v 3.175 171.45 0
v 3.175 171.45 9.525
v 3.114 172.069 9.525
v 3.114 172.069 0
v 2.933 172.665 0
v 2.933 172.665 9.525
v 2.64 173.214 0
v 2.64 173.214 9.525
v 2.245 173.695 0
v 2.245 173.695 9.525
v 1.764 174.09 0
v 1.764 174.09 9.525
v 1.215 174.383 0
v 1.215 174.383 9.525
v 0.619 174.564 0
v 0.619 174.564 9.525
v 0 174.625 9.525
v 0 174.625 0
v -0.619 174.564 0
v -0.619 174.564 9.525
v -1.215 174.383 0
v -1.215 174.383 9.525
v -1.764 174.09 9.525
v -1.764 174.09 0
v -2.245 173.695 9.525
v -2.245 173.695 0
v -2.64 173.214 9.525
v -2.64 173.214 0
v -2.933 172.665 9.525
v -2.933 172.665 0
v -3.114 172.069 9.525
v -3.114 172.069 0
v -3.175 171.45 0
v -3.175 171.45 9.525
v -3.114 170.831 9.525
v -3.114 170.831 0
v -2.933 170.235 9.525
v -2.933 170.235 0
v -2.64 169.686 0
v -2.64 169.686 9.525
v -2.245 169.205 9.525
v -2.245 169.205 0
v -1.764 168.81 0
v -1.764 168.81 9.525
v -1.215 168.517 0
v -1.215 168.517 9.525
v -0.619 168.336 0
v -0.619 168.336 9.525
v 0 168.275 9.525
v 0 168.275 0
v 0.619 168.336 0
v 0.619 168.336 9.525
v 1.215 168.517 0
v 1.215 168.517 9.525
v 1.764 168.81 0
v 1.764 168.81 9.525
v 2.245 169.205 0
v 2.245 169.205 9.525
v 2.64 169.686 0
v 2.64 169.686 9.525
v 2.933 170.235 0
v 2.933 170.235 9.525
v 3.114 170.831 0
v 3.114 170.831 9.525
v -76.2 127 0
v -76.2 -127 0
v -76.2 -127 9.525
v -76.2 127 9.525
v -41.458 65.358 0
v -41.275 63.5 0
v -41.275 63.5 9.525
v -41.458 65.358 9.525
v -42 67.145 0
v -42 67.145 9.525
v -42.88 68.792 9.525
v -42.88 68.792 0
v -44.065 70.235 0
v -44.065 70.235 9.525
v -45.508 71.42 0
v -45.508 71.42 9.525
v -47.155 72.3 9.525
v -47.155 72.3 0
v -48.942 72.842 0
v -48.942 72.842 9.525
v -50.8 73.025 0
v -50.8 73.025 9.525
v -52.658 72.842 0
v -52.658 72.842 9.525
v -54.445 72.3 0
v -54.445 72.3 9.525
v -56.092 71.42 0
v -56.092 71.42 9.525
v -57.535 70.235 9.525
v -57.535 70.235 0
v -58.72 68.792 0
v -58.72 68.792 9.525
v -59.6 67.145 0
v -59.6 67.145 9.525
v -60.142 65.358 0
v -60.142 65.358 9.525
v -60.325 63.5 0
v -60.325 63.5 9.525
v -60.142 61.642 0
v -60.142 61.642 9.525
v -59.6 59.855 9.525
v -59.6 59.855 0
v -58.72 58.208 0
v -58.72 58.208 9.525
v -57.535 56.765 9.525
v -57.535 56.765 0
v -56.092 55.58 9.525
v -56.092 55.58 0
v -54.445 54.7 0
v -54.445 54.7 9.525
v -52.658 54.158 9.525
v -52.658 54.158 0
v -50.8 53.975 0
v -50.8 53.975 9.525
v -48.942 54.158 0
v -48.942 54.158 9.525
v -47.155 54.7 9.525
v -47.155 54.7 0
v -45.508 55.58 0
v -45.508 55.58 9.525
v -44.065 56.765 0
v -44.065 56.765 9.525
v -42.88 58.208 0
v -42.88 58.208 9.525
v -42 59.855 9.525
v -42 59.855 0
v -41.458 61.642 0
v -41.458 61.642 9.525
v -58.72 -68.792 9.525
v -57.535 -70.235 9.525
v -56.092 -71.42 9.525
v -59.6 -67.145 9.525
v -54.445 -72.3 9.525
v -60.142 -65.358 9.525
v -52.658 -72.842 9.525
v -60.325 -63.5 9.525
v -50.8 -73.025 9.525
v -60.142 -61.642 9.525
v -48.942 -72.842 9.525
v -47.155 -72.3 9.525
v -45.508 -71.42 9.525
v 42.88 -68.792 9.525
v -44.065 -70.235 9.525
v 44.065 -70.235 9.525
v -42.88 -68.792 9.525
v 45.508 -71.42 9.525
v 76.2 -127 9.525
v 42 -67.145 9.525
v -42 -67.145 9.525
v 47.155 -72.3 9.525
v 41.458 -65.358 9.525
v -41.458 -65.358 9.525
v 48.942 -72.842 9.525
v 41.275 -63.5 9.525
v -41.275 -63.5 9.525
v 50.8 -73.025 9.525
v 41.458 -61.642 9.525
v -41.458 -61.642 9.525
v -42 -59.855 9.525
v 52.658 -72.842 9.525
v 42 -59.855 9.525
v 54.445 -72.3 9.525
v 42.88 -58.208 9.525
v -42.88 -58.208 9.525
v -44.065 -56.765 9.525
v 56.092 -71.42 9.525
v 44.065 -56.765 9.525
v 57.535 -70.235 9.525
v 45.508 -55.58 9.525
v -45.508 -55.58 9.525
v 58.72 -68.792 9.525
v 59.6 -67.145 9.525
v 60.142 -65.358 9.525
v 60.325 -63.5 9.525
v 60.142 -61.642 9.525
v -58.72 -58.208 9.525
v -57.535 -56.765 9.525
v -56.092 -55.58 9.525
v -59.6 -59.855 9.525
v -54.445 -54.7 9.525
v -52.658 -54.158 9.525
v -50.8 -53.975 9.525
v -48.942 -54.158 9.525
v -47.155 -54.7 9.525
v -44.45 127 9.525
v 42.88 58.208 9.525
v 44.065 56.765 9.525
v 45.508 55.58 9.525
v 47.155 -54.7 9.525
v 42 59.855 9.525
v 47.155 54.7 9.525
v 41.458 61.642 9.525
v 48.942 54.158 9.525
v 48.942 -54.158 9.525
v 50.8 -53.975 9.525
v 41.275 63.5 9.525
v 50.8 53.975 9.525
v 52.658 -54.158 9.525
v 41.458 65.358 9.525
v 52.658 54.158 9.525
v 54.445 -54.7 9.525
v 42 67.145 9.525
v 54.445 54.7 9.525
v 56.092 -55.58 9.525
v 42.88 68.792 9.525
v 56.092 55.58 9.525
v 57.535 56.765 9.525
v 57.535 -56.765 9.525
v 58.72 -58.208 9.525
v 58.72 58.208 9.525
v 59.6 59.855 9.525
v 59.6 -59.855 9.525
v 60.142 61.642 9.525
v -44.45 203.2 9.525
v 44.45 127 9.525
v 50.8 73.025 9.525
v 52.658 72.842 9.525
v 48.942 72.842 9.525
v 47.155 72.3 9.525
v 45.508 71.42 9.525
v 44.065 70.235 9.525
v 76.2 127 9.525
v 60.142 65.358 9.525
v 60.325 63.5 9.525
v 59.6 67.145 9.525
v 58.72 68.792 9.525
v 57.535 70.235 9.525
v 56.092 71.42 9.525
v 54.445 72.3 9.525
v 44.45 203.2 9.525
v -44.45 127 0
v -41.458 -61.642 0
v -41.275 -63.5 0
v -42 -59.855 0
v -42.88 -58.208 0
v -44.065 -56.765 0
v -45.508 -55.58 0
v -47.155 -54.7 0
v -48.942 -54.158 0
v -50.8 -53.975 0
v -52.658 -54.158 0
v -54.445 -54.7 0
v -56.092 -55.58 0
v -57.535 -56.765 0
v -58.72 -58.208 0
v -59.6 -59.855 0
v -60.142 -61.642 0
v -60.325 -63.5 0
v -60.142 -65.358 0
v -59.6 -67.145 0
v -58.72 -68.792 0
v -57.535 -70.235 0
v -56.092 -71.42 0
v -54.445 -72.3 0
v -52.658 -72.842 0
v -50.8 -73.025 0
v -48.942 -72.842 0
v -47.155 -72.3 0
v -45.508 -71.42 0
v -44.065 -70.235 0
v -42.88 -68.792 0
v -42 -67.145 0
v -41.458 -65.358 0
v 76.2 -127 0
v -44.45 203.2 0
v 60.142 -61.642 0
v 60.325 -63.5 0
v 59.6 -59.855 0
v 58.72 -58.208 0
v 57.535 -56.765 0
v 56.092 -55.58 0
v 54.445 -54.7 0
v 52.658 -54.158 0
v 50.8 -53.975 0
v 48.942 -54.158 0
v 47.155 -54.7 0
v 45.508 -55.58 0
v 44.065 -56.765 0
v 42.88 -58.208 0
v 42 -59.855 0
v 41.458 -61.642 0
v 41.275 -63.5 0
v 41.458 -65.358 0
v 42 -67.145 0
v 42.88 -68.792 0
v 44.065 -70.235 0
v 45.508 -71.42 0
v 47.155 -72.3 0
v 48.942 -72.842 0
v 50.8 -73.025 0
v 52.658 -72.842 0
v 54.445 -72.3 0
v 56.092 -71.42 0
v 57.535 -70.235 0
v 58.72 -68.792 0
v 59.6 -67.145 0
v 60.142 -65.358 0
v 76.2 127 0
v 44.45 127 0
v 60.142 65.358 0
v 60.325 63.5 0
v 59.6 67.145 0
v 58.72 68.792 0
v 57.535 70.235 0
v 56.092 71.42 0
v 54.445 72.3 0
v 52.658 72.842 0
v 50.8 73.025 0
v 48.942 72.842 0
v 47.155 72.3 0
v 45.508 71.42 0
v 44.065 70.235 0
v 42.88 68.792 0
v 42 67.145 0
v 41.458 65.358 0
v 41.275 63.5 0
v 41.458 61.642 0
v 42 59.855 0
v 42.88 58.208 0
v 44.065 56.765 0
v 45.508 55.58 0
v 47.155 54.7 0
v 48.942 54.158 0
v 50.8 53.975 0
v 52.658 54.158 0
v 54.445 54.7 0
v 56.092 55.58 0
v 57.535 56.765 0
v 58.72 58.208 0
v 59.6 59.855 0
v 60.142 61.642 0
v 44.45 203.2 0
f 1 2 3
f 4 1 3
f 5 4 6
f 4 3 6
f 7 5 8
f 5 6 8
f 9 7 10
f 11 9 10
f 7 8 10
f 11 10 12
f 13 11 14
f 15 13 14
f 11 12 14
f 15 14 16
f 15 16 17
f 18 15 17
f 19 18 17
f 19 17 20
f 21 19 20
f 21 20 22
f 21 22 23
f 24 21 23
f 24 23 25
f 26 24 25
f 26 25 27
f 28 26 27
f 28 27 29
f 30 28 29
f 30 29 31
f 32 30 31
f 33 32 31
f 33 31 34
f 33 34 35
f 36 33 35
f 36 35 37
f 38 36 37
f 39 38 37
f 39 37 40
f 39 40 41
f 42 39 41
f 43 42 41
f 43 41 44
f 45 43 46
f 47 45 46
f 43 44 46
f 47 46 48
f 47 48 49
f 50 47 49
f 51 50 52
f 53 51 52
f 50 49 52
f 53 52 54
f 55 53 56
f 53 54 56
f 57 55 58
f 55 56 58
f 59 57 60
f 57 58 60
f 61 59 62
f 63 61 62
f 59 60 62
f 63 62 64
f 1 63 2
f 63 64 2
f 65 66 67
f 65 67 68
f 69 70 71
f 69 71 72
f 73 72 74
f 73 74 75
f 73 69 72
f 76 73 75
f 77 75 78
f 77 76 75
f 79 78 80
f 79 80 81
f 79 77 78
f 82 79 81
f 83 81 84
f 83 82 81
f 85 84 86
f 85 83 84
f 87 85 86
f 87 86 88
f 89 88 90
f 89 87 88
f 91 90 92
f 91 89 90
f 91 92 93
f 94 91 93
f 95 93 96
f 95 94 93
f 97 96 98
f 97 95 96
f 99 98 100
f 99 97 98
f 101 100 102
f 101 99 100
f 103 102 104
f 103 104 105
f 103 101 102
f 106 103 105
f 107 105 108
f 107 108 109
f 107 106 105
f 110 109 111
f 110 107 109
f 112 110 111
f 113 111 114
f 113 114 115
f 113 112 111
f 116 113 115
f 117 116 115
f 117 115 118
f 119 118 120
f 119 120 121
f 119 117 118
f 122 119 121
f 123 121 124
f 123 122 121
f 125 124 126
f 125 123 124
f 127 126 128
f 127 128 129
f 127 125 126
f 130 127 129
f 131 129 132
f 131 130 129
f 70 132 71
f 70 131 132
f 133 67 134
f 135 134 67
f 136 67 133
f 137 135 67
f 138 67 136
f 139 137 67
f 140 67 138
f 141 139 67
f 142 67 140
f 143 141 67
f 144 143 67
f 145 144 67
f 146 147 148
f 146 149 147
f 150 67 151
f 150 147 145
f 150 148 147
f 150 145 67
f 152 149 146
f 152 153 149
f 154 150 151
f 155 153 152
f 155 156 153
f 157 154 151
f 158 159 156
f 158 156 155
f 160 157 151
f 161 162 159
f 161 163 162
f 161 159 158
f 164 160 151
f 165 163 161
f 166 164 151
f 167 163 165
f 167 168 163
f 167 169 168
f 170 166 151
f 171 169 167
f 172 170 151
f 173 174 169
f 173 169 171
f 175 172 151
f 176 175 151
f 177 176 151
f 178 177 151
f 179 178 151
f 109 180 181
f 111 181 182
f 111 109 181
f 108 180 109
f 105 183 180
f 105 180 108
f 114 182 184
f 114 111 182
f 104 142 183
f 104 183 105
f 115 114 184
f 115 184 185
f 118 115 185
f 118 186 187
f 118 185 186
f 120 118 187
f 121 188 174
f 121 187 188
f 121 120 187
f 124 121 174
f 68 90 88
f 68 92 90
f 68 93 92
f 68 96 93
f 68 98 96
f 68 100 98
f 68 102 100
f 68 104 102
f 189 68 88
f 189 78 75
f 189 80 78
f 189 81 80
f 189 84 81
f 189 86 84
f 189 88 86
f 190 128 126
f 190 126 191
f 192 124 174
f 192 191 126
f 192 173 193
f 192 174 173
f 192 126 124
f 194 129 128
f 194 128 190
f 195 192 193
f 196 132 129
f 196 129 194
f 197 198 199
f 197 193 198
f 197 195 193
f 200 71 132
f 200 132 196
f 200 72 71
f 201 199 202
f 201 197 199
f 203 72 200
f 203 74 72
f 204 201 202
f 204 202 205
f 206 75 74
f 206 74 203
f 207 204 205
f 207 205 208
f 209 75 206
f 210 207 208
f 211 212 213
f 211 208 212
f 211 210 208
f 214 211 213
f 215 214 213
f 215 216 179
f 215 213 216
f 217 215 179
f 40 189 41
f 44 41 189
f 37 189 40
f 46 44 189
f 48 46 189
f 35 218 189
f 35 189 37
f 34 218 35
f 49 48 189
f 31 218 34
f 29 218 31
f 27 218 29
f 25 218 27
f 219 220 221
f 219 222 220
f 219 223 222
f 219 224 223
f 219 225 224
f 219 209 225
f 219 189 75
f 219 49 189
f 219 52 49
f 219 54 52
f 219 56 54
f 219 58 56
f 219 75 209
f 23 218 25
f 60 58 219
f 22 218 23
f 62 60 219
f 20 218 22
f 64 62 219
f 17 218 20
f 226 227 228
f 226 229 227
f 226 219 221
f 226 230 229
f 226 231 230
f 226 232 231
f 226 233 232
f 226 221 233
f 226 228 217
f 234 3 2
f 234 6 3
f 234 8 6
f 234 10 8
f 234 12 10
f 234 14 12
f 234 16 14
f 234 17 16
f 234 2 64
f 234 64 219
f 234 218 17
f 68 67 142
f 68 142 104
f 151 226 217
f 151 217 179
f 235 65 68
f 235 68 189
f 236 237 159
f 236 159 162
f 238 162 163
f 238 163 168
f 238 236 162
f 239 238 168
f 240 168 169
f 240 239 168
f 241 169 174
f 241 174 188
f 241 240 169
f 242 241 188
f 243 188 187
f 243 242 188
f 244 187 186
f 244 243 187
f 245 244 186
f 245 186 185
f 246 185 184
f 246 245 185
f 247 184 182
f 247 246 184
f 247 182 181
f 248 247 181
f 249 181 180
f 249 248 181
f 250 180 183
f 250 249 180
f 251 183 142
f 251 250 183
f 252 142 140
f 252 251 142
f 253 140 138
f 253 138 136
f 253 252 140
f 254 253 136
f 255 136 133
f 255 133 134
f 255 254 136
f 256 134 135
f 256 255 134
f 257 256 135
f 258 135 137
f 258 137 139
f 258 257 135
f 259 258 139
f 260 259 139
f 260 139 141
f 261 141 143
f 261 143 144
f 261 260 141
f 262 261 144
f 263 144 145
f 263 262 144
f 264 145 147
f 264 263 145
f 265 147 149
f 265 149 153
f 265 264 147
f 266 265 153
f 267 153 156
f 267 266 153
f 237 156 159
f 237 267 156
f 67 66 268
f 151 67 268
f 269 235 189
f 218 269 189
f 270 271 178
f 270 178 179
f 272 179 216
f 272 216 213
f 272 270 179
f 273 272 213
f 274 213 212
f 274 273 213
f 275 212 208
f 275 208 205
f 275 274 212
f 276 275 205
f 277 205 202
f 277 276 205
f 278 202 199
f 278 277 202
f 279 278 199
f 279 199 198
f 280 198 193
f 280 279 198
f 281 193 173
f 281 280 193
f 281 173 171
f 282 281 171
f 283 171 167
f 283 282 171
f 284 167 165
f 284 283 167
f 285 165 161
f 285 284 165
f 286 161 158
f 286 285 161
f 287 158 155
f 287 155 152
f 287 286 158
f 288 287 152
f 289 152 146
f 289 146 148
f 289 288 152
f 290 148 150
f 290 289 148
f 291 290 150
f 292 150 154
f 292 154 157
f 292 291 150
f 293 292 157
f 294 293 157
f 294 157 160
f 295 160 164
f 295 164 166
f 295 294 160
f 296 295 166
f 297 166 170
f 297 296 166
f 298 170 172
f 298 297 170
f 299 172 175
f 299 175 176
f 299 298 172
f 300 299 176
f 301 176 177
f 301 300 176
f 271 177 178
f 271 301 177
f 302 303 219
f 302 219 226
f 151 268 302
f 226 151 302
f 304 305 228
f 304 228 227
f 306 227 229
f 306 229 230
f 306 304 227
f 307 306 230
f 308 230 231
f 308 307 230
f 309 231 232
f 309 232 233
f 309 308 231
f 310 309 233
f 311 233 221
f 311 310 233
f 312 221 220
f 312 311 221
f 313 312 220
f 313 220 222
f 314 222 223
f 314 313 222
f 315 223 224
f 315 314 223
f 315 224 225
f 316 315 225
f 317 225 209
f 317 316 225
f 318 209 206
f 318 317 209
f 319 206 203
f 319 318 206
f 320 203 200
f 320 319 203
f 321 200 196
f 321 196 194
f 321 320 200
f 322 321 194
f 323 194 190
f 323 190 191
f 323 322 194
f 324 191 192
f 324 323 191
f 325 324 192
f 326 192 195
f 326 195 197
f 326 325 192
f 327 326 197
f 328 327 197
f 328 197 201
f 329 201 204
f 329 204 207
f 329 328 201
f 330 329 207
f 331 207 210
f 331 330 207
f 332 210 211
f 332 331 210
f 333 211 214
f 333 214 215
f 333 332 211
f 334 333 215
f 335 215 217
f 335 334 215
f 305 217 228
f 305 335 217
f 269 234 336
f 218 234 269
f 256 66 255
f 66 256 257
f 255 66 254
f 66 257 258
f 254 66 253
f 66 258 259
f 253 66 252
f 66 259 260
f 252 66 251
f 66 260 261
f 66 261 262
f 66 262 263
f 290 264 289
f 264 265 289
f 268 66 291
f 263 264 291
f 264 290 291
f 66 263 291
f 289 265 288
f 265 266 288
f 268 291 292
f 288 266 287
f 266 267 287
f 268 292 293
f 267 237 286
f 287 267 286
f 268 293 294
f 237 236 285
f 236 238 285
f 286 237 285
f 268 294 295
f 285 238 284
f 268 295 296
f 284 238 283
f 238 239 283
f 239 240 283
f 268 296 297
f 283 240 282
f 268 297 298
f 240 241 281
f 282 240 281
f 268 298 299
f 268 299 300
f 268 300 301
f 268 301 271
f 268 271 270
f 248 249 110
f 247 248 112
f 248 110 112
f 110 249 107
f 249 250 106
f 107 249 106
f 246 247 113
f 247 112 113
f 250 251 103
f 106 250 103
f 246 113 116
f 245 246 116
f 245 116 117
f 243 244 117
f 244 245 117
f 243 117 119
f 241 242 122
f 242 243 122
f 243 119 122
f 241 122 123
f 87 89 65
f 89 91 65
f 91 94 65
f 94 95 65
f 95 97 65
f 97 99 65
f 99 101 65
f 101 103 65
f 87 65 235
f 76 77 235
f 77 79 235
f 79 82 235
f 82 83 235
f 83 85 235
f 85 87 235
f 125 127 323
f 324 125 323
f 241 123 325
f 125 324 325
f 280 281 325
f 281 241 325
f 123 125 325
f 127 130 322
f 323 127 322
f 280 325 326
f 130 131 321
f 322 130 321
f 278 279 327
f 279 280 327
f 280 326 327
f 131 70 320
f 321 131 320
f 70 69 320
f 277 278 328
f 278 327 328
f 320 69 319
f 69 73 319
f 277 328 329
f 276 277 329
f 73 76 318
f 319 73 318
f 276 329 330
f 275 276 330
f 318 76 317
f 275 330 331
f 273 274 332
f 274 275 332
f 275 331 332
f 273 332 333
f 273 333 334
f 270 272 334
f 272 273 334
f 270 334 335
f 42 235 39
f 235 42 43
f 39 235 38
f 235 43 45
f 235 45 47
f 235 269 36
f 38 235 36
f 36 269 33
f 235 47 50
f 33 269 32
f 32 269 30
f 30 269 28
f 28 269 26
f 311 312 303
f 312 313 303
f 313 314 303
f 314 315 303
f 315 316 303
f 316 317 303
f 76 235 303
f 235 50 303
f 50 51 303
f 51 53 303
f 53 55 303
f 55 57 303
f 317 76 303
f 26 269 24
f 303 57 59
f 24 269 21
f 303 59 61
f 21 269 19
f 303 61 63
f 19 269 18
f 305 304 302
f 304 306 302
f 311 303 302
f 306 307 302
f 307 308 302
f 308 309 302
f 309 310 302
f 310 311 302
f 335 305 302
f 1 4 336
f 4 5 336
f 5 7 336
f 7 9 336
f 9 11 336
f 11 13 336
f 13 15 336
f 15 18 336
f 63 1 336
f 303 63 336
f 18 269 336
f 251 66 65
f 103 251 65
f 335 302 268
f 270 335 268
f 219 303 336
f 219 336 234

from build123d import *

# Parameters (mm, degrees)
F0_W     = 152.4
F0_H     = 254
F0_R     = 9.525
F1_DEPTH = 9.525
F2_W     = 88.9
F2_H     = 9.525
F3_DEPTH = 76.2
F4_R     = 3.175
F5_DEPTH = 9.526


with BuildPart() as f1:
    # F0 (on Top) → F1 (new body)
    with BuildSketch(Plane.XY):
        Rectangle(F0_W, F0_H)
        with Locations((-50.8, -63.5)):
            Circle(F0_R, mode=Mode.SUBTRACT)
        with Locations((50.8, -63.5)):
            Circle(F0_R, mode=Mode.SUBTRACT)
        with Locations((-50.8, 63.5)):
            Circle(F0_R, mode=Mode.SUBTRACT)
        with Locations((50.8, 63.5)):
            Circle(F0_R, mode=Mode.SUBTRACT)
    extrude(amount=F1_DEPTH)

    # F2 (on face) → F3 (join)
    with BuildSketch(Plane(origin=(0, 127, 0), x_dir=(-1, 0, 0), z_dir=(0, 1, 0))):
        with Locations((0, 4.7625)):
            Rectangle(F2_W, F2_H)
    extrude(amount=F3_DEPTH)

    # F4 (on face) → F5 (cut, through all)
    with BuildSketch(Plane.XY.offset(9.525)):
        with Locations((0, 171.45)):
            Circle(F4_R)
    extrude(amount=-F5_DEPTH, mode=Mode.SUBTRACT)


solid = f1.part
